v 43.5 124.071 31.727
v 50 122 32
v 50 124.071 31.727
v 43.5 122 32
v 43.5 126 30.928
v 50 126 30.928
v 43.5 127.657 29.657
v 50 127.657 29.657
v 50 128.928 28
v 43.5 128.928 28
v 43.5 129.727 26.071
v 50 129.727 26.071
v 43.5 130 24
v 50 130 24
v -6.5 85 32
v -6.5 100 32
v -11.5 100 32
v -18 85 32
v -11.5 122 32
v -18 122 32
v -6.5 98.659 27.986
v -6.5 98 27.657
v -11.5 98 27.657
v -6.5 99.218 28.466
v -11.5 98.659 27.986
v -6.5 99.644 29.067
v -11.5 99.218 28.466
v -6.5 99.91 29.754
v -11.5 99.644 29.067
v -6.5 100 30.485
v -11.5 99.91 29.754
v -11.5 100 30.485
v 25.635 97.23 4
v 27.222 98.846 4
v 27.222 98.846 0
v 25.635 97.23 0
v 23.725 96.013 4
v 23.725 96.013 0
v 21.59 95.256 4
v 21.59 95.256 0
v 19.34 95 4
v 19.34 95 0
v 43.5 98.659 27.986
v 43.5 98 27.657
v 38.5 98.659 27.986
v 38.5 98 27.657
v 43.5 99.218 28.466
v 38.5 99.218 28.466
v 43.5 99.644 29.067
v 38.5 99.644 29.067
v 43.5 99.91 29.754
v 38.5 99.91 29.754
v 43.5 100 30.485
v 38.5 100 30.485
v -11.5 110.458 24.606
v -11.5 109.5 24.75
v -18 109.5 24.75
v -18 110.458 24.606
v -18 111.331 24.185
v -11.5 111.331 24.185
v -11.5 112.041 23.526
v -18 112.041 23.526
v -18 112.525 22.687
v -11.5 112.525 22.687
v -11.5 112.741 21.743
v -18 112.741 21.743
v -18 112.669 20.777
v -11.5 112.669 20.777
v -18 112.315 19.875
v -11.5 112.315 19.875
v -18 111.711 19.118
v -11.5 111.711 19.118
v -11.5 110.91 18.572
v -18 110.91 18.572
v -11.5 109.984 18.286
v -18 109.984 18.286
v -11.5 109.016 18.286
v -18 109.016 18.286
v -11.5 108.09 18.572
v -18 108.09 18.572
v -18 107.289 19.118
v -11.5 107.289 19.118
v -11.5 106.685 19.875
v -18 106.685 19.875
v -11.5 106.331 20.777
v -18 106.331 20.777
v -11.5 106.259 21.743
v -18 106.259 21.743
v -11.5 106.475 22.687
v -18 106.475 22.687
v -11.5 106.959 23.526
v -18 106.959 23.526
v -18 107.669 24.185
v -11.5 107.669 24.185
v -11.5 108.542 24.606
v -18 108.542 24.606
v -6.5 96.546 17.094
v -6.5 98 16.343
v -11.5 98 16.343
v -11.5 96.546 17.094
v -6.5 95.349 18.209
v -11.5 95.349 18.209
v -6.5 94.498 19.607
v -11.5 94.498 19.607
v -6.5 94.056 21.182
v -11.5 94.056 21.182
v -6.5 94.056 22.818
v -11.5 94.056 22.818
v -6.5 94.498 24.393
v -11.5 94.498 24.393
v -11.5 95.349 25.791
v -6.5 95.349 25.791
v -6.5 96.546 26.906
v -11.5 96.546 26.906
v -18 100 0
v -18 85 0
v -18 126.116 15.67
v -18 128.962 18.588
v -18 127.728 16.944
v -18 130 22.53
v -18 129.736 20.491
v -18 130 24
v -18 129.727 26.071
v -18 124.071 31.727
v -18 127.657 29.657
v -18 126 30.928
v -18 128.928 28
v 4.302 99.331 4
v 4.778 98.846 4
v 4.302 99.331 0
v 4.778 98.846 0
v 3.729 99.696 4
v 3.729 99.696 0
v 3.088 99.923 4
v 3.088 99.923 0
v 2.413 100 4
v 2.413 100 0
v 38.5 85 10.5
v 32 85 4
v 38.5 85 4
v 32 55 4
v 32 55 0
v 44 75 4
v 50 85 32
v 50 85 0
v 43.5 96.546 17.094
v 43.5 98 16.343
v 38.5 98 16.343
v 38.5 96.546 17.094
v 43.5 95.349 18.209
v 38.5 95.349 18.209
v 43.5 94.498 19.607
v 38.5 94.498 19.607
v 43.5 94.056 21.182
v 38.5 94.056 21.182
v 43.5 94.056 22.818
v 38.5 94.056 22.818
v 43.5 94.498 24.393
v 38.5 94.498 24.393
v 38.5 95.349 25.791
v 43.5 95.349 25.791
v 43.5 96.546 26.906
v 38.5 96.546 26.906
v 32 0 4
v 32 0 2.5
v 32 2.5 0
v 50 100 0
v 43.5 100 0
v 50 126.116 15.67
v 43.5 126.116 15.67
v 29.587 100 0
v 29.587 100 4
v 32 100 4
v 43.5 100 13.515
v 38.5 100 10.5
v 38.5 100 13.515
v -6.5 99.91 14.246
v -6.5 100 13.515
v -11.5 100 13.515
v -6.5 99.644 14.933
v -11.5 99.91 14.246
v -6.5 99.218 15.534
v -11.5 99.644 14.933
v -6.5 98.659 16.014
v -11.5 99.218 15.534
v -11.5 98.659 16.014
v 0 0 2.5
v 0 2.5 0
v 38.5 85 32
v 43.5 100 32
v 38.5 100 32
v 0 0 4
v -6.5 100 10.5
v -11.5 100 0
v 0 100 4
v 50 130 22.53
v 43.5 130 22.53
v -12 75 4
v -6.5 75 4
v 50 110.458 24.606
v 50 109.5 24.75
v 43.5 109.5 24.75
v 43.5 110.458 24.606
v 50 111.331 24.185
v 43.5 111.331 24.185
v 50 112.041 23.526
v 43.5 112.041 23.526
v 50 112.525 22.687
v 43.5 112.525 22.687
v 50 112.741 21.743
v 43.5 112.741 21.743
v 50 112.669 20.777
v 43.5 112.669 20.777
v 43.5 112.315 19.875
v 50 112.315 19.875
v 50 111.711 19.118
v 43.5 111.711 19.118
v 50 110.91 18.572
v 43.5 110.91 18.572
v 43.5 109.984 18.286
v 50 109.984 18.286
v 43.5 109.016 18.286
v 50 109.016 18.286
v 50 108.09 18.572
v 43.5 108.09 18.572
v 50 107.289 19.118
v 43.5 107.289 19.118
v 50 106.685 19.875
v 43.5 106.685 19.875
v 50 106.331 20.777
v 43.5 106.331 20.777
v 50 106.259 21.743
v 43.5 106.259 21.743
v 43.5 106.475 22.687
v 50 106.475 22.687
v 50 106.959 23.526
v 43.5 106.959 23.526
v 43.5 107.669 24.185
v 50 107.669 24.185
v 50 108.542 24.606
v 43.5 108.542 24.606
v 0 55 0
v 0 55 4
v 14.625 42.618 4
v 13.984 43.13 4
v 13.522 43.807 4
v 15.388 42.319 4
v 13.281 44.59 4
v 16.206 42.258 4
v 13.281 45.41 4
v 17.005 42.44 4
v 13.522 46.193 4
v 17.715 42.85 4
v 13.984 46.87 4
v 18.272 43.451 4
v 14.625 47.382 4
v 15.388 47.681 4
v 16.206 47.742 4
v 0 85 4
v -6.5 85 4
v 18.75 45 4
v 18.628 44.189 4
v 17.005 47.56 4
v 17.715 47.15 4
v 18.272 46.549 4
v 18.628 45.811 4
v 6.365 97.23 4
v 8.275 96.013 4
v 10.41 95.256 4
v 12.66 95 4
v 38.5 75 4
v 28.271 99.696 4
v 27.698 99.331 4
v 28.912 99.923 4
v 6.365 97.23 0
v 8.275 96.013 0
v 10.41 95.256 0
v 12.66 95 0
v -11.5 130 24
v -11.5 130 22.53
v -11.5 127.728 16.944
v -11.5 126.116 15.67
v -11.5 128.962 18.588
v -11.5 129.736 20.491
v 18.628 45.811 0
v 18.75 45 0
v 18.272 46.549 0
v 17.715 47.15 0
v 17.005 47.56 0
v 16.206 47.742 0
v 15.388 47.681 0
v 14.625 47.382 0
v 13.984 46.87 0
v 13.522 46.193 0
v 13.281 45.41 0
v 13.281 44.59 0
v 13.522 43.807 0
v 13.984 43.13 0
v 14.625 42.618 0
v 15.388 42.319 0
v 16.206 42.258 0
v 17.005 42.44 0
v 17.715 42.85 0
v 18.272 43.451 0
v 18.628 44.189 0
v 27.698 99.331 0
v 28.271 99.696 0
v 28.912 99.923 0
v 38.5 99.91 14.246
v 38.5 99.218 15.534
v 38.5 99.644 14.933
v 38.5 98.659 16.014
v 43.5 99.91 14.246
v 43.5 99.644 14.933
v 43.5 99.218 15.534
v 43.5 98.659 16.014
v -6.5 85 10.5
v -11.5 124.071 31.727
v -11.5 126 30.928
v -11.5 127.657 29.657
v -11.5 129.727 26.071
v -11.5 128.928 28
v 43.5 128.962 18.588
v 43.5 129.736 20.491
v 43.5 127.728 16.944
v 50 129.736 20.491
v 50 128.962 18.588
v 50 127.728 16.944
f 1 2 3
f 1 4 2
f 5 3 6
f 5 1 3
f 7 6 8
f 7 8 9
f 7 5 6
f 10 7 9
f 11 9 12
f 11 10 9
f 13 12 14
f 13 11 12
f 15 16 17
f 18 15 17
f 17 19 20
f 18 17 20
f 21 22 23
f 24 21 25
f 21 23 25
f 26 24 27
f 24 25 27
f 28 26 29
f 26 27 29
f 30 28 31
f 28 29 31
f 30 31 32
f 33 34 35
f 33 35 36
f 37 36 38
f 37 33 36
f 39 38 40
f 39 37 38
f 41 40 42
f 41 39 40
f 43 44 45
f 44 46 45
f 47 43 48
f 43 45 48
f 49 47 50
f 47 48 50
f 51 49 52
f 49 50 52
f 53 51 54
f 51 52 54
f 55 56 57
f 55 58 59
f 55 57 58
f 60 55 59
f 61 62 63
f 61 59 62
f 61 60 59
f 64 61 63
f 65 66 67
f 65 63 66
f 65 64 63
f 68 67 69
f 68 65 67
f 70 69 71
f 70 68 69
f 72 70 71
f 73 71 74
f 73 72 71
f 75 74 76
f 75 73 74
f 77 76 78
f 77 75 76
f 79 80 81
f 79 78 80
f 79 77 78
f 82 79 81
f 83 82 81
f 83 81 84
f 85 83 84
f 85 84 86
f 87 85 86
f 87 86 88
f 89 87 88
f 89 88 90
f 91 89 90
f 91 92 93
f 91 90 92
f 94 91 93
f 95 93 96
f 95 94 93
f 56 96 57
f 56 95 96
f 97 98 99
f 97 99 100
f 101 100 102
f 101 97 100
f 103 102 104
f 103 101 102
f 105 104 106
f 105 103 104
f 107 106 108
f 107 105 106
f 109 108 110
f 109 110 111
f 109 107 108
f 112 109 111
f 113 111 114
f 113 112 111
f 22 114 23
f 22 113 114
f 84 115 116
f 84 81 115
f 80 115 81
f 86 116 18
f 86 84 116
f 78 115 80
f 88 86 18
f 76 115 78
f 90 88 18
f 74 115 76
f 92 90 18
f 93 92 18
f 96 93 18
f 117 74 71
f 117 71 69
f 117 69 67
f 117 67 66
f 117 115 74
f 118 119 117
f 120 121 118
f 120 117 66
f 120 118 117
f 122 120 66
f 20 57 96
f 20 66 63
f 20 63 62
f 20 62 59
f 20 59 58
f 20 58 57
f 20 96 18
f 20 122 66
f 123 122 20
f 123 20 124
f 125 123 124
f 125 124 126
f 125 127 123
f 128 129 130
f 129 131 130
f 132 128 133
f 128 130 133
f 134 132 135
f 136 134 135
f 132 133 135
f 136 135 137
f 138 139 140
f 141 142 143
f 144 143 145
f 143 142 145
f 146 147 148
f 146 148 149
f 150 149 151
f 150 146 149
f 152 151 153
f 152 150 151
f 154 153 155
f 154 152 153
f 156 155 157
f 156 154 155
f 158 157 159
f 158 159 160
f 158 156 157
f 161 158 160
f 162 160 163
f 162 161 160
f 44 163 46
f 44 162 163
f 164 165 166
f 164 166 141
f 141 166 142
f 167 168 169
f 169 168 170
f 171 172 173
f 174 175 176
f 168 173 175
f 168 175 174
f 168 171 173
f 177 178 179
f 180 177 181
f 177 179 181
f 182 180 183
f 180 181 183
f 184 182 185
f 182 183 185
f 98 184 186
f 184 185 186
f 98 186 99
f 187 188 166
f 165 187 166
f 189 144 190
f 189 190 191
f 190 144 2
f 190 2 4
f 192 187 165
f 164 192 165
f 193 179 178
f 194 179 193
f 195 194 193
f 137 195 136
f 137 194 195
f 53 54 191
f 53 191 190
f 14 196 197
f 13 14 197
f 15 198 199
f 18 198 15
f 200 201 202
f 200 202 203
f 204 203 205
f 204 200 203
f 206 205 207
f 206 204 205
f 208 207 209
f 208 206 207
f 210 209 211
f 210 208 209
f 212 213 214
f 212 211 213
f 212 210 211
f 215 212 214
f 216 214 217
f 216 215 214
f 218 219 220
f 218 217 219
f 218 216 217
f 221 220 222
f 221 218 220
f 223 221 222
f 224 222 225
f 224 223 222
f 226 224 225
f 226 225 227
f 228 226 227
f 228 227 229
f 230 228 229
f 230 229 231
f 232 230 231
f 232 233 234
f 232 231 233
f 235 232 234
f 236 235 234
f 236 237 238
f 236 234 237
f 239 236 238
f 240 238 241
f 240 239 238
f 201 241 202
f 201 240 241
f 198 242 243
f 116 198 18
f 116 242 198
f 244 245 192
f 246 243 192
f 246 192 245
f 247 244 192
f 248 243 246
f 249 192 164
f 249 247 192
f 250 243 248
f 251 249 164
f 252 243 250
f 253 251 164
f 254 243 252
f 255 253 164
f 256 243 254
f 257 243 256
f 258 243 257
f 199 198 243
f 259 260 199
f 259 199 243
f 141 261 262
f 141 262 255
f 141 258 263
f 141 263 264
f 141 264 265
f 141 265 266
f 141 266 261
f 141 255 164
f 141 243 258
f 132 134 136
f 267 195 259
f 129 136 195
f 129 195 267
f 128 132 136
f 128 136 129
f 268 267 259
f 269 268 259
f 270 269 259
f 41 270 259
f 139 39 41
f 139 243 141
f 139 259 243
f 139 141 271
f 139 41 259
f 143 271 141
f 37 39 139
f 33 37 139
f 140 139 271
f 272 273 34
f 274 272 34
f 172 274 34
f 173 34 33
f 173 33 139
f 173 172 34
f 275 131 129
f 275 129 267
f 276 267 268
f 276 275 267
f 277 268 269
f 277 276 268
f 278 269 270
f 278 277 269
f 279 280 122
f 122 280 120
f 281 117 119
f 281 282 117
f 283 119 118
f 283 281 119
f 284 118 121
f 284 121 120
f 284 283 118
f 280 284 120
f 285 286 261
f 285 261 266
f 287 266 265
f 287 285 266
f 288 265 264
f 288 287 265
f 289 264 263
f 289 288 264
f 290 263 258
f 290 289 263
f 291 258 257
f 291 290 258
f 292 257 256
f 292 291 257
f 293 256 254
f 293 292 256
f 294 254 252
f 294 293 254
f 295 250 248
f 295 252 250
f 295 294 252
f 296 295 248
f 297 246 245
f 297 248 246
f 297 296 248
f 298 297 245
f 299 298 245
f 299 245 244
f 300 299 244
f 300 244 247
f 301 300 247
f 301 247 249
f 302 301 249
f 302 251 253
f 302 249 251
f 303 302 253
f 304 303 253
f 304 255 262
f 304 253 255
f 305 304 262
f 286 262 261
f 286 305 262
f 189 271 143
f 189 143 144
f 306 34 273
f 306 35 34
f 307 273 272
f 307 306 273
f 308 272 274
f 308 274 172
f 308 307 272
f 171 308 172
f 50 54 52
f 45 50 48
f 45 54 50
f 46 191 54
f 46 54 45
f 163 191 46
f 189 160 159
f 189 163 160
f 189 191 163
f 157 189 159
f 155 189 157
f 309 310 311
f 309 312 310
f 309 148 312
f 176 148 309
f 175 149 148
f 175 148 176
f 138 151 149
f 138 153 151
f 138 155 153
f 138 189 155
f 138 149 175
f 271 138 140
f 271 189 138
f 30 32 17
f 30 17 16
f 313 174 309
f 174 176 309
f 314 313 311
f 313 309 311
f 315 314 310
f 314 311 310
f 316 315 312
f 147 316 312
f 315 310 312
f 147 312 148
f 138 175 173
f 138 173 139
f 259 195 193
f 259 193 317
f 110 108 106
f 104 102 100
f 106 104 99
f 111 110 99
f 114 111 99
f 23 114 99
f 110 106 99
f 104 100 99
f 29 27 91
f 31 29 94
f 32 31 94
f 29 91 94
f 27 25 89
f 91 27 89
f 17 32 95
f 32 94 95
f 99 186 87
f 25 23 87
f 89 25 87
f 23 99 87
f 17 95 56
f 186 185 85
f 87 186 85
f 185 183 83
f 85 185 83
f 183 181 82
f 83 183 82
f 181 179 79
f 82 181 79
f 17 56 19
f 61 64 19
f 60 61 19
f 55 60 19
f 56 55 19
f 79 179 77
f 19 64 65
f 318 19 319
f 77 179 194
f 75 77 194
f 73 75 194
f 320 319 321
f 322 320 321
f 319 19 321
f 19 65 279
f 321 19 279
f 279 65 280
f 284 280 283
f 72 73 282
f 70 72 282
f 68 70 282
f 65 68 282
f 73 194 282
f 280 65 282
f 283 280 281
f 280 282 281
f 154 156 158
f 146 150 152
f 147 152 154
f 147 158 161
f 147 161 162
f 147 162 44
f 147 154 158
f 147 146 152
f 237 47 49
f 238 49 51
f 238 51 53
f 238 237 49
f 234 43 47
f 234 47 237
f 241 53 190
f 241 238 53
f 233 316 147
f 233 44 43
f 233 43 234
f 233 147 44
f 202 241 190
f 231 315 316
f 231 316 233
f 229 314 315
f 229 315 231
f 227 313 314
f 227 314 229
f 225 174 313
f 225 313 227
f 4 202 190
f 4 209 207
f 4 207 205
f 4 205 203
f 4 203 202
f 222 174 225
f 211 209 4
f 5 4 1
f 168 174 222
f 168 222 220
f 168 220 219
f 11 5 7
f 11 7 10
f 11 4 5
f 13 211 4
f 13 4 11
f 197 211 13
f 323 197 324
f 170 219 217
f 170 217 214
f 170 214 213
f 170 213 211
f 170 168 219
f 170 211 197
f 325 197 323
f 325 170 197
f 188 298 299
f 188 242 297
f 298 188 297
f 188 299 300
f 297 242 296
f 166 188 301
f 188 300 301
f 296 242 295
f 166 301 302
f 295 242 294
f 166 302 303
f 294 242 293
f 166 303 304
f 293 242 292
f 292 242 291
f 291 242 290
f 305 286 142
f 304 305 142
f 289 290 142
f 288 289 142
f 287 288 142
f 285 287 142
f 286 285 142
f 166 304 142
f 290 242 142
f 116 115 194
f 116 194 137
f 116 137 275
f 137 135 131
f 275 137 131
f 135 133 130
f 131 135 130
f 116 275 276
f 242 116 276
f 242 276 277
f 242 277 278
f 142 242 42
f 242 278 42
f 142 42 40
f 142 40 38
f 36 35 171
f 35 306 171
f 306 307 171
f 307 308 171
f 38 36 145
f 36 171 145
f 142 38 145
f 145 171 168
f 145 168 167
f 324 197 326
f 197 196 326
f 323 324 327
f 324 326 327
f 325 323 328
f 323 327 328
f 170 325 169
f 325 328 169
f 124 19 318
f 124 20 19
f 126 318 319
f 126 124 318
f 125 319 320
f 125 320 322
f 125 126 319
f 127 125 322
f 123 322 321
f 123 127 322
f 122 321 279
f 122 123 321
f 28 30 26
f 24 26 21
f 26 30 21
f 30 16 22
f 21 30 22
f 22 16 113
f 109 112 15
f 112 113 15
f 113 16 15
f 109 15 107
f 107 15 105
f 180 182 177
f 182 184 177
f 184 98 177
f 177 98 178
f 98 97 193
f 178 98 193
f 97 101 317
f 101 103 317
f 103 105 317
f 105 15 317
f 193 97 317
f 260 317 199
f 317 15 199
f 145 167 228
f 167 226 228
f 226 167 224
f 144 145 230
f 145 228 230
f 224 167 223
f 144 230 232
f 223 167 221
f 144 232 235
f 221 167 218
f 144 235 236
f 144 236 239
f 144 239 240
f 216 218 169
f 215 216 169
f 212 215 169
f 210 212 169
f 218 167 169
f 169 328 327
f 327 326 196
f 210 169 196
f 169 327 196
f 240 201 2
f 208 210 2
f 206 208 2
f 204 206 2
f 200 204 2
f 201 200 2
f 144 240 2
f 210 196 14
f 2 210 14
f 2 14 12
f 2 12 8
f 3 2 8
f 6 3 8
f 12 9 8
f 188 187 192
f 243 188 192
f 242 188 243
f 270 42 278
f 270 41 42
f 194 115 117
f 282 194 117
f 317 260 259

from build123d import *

# Parameters (mm, degrees)
ESQUISSE1_W                   = 32
ESQUISSE1_H                   = 100
BOSS_EXTRU_1_DEPTH            = 4
CHANFREIN1_SIZE               = 2.5
ESQUISSE2_W                   = 18
ESQUISSE2_H                   = 45
BOSS_EXTRU_2_DEPTH            = 32
ENL_V_MAT_EXTRU_1_DEPTH       = 151.159914758
ENL_V_MAT_EXTRU_1_DEPTH_BACK  = 151.159914758
ESQUISSE3_R                   = 3.25
ENL_V_MAT_EXTRU_2_DEPTH       = 143.91256068
ENL_V_MAT_EXTRU_2_DEPTH_BACK  = 143.91256068
ESQUISSE4_W                   = 55
ESQUISSE4_H                   = 32
ENL_V_MAT_EXTRU_3_DEPTH       = 117.292734081
ENL_V_MAT_EXTRU_3_DEPTH_BACK  = 117.292734081
ESQUISSE5_W                   = 45
ESQUISSE5_H                   = 23.5
CHANFREIN2_SIZE               = 6.5
ENL_V_MAT_EXTRU_4_DEPTH       = 5
ENL_V_START                   = 50
ENL_V_MAT_EXTRU_6_DEPTH       = 5
CONG_2_R                      = 3
ENL_V_MAT_EXTRU_7_DEPTH       = 151.159914758
ENL_V_MAT_EXTRU_7_DEPTH_BACK  = 151.159914758
CONG_3_R                      = 8
BOSS_EXTRU_3_DEPTH            = 4
BOSS_EXTRU_4_DEPTH            = 68
ESQUISSE10_W                  = 45
ESQUISSE10_H                  = 10
ENL_V_MAT_EXTRU_8_DEPTH       = 143.070405081
ENL_V_MAT_EXTRU_9_DEPTH       = 143.070405081
ENL_V_MAT_EXTRU_9_DEPTH_BACK  = 143.070405081
ESQUISSE11_R                  = 2.75
ENL_V_MAT_EXTRU_10_DEPTH      = 143.91256068
ENL_V_MAT_EXTRU_10_DEPTH_BACK = 143.91256068
ESQUISSE12_W                  = 24
ESQUISSE12_H                  = 5
CONG_4_R                      = 10
CONG_5_R                      = 3


# Some blends are built 0.0001 mm under size
with BuildPart() as part:
    # Esquisse1 → Boss.-Extru.1 (new body)
    with BuildSketch(Plane.XY):
        with Locations((16, 50)):
            Rectangle(ESQUISSE1_W, ESQUISSE1_H)
    extrude(amount=BOSS_EXTRU_1_DEPTH)

    # Chanfrein1
    chanfrein1_edges = [part.edges().sort_by_distance(p)[0] for p in [
        (16, 0, 0),
    ]]
    chamfer(chanfrein1_edges, length=CHANFREIN1_SIZE)

    # Esquisse2 → Boss.-Extru.2 (add)
    with BuildSketch(Plane(origin=(0, 0, 0), x_dir=(-1, 0, 0), z_dir=(0, 0, -1))):
        with Locations((-41, 107.5)):
            Rectangle(ESQUISSE2_W, ESQUISSE2_H)
        with Locations((9, 107.5)):
            Rectangle(ESQUISSE2_W, ESQUISSE2_H)
    extrude(amount=-BOSS_EXTRU_2_DEPTH)

    # Esquisse3 → Enlèv. mat.-Extru.1 (cut, two sides: drawn at the far end of the back side and taken through both)
    with BuildSketch(Plane.ZY.offset(18).offset(-ENL_V_MAT_EXTRU_1_DEPTH_BACK)):
        with Locations((21.5, 109.5)):
            Circle(ESQUISSE3_R)
    extrude(amount=ENL_V_MAT_EXTRU_1_DEPTH + ENL_V_MAT_EXTRU_1_DEPTH_BACK, mode=Mode.SUBTRACT)

    # Esquisse4 → Enlèv. mat.-Extru.2 (cut, two sides: drawn at the far end of the back side and taken through both)
    with BuildSketch(Plane.XY.offset(32).offset(-ENL_V_MAT_EXTRU_2_DEPTH_BACK)):
        with Locations((16, 116)):
            Rectangle(ESQUISSE4_W, ESQUISSE4_H)
    extrude(amount=ENL_V_MAT_EXTRU_2_DEPTH + ENL_V_MAT_EXTRU_2_DEPTH_BACK, mode=Mode.SUBTRACT)

    # Esquisse5 → Enlèv. mat.-Extru.3 (cut, two sides: drawn at the far end of the back side and taken through both)
    with BuildSketch(Plane(origin=(0, 100, 0), x_dir=(1, 0, 0), z_dir=(0, 1, 0)).offset(-ENL_V_MAT_EXTRU_3_DEPTH_BACK)):
        with Locations((16, -22.25)):
            Rectangle(ESQUISSE5_W, ESQUISSE5_H)
    extrude(amount=ENL_V_MAT_EXTRU_3_DEPTH + ENL_V_MAT_EXTRU_3_DEPTH_BACK, mode=Mode.SUBTRACT)

    # Chanfrein2
    chanfrein2_edges = [part.edges().sort_by_distance(p)[0] for p in [
        (0, 92.5, 10.5),
        (32, 92.5, 10.5),
    ]]
    chamfer(chanfrein2_edges, length=CHANFREIN2_SIZE - 0.0001)  # a hair under: the kernel refuses the full size

    # Esquisse6 → Enlèv. mat.-Extru.4 (cut)
    with BuildSketch(Plane(origin=(-6.5, 0, 0), x_dir=(0, 0, -1), z_dir=(1, 0, 0))):
        with BuildLine():
            Line((-28, 100), (-16, 100))
            ThreePointArc((-16, 100), (-22, 94), (-28, 100))
        make_face()
    extrude(amount=-ENL_V_MAT_EXTRU_4_DEPTH, mode=Mode.SUBTRACT)

    # Esquisse6<2> → Enlèv. mat.-Extru.6 (cut)
    with BuildSketch(Plane(origin=(-6.5, 0, 0), x_dir=(0, 0, -1), z_dir=(1, 0, 0)).offset(ENL_V_START)):
        with BuildLine():
            Line((-28, 100), (-16, 100))
            ThreePointArc((-16, 100), (-22, 94), (-28, 100))
        make_face()
    extrude(amount=-ENL_V_MAT_EXTRU_6_DEPTH, mode=Mode.SUBTRACT)

    # Congé2
    cong_2_edges = [part.edges().sort_by_distance(p)[0] for p in [
        (-9, 100, 16),
        (-9, 100, 28),
        (41, 100, 16),
        (41, 100, 28),
    ]]
    fillet(cong_2_edges, radius=CONG_2_R)

    # Esquisse7 → Enlèv. mat.-Extru.7 (cut, two sides: drawn at the far end of the back side and taken through both)
    with BuildSketch(Plane(origin=(50, 0, 0), x_dir=(0, 0, -1), z_dir=(1, 0, 0)).offset(-ENL_V_MAT_EXTRU_7_DEPTH_BACK)):
        Polygon((0, 100), (-18, 130), (0, 130), align=None)
    extrude(amount=ENL_V_MAT_EXTRU_7_DEPTH + ENL_V_MAT_EXTRU_7_DEPTH_BACK, mode=Mode.SUBTRACT)

    # Congé3
    cong_3_edges = [part.edges().sort_by_distance(p)[0] for p in [
        (46.75, 130, 18),
        (-14.75, 130, 18),
        (-14.75, 130, 32),
        (46.75, 130, 32),
    ]]
    fillet(cong_3_edges, radius=CONG_3_R)

    # Esquisse8 → Boss.-Extru.3 (add)
    with BuildSketch(Plane(origin=(0, 0, 0), x_dir=(-1, 0, 0), z_dir=(0, 0, -1))):
        Polygon((0, 55), (18, 85), (0, 85), align=None)
        Polygon((-32, 85), (-32, 55), (-50, 85), align=None)
    extrude(amount=-BOSS_EXTRU_3_DEPTH)

    # Esquisse9 → Boss.-Extru.4 (add)
    with BuildSketch(Plane.ZY.offset(18)):
        Polygon((32, 85), (4, 85), (4, 75), align=None)
    extrude(amount=-BOSS_EXTRU_4_DEPTH)

    # Esquisse10 → Enlèv. mat.-Extru.8 (cut, through all)
    with BuildSketch(Plane.XY.offset(4)):
        with Locations((16, 80)):
            Rectangle(ESQUISSE10_W, ESQUISSE10_H)
        Polygon((44, 75), (50, 85), (50, 75), align=None)
        Polygon((-12, 75), (-18, 85), (-18, 75), align=None)
    extrude(amount=ENL_V_MAT_EXTRU_8_DEPTH, mode=Mode.SUBTRACT)

    # Esquisse11 → Enlèv. mat.-Extru.9 (cut, two sides: drawn at the far end of the back side and taken through both)
    with BuildSketch(Plane.XY.offset(4).offset(-ENL_V_MAT_EXTRU_9_DEPTH_BACK)):
        with Locations((16, 45)):
            Circle(ESQUISSE11_R)
    extrude(amount=ENL_V_MAT_EXTRU_9_DEPTH + ENL_V_MAT_EXTRU_9_DEPTH_BACK, mode=Mode.SUBTRACT)

    # Esquisse12 → Enlèv. mat.-Extru.10 (cut, two sides: drawn at the far end of the back side and taken through both)
    with BuildSketch(Plane(origin=(0, 0, 0), x_dir=(-1, 0, 0), z_dir=(0, 0, -1)).offset(-ENL_V_MAT_EXTRU_10_DEPTH_BACK)):
        with Locations((-16, 97.5)):
            Rectangle(ESQUISSE12_W, ESQUISSE12_H)
    extrude(amount=ENL_V_MAT_EXTRU_10_DEPTH + ENL_V_MAT_EXTRU_10_DEPTH_BACK, mode=Mode.SUBTRACT)

    # Congé4
    # the kernel refuses this fillet: 10 mm, written as the material it adds along each edge
    with BuildSketch(Plane(origin=(4, 95, 0), x_dir=(0, 1, 0), z_dir=(0, 0, 1))) as cong_4_piece_1:
        with BuildLine():
            CenterArc((10, -8.660254038), CONG_4_R, 120, 60)
            Line((0, -8.660254038), (-0.2, -8.660254038))
            Line((-0.2, -8.660254038), (-0.2, 0))
            Line((-0.2, 0), (0, 0.2))
            ThreePointArc((0, 0.2), (2.5, 0.2), (4.9, 0.173205081))
            Line((4.9, 0.173205081), (5, 0))
        make_face()
    extrude(amount=4)
    with BuildSketch(Plane(origin=(28, 95, 4), x_dir=(-1, 0, 0), z_dir=(0, 0, -1))) as cong_4_piece_2:
        with BuildLine():
            CenterArc((8.660254038, 10), CONG_4_R, 210, 60)
            Line((0, 5), (-0.173205081, 4.9))
            ThreePointArc((-0.173205081, 4.9), (-0.2, 2.5), (-0.2, 0))
            Line((-0.2, 0), (0, -0.2))
            Line((0, -0.2), (8.660254038, -0.2))
            Line((8.660254038, -0.2), (8.660254038, 0))
        make_face()
    extrude(amount=4)

    # Congé5
    cong_5_edges = [part.edges().sort_by_distance(p)[0] for p in [
        (28, 100, 2),
        (4, 100, 2),
    ]]
    fillet(cong_5_edges, radius=CONG_5_R)


solid = part.part
